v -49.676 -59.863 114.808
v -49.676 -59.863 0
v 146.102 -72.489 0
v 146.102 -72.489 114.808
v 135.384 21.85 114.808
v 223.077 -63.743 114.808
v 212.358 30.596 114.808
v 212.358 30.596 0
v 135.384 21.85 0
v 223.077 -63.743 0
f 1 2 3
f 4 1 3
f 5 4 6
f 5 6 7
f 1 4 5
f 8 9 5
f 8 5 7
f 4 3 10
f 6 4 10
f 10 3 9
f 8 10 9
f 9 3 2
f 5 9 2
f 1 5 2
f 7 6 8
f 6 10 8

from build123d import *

# Parameters (mm, degrees)
F1_DEPTH = 76.708
F2_DEPTH = 77.47
F3_DEPTH = 38.1


with BuildPart() as f1:
    # F0 (on Top) → F1 (new body)
    with BuildSketch(Plane.XY):
        Polygon((135.3836357594, 21.8498203903), (-49.6764220297, -59.8627962172), (146.1022645235, -72.4891498685), align=None)
    extrude(amount=F1_DEPTH)

    # F2 (add): a face of the model
    f2_faces = [f1.faces().sort_by_distance(p)[0] for p in [
        (140.7429501414, -25.3196647391, 38.354),
    ]]
    extrude(f2_faces, amount=F2_DEPTH)

    # F3 (add): a face of the model
    f3_faces = [f1.faces().sort_by_distance(p)[0] for p in [
        (122.6602477732, -29.7614131006, 76.708),
    ]]
    extrude(f3_faces, amount=F3_DEPTH)


solid = f1.part
